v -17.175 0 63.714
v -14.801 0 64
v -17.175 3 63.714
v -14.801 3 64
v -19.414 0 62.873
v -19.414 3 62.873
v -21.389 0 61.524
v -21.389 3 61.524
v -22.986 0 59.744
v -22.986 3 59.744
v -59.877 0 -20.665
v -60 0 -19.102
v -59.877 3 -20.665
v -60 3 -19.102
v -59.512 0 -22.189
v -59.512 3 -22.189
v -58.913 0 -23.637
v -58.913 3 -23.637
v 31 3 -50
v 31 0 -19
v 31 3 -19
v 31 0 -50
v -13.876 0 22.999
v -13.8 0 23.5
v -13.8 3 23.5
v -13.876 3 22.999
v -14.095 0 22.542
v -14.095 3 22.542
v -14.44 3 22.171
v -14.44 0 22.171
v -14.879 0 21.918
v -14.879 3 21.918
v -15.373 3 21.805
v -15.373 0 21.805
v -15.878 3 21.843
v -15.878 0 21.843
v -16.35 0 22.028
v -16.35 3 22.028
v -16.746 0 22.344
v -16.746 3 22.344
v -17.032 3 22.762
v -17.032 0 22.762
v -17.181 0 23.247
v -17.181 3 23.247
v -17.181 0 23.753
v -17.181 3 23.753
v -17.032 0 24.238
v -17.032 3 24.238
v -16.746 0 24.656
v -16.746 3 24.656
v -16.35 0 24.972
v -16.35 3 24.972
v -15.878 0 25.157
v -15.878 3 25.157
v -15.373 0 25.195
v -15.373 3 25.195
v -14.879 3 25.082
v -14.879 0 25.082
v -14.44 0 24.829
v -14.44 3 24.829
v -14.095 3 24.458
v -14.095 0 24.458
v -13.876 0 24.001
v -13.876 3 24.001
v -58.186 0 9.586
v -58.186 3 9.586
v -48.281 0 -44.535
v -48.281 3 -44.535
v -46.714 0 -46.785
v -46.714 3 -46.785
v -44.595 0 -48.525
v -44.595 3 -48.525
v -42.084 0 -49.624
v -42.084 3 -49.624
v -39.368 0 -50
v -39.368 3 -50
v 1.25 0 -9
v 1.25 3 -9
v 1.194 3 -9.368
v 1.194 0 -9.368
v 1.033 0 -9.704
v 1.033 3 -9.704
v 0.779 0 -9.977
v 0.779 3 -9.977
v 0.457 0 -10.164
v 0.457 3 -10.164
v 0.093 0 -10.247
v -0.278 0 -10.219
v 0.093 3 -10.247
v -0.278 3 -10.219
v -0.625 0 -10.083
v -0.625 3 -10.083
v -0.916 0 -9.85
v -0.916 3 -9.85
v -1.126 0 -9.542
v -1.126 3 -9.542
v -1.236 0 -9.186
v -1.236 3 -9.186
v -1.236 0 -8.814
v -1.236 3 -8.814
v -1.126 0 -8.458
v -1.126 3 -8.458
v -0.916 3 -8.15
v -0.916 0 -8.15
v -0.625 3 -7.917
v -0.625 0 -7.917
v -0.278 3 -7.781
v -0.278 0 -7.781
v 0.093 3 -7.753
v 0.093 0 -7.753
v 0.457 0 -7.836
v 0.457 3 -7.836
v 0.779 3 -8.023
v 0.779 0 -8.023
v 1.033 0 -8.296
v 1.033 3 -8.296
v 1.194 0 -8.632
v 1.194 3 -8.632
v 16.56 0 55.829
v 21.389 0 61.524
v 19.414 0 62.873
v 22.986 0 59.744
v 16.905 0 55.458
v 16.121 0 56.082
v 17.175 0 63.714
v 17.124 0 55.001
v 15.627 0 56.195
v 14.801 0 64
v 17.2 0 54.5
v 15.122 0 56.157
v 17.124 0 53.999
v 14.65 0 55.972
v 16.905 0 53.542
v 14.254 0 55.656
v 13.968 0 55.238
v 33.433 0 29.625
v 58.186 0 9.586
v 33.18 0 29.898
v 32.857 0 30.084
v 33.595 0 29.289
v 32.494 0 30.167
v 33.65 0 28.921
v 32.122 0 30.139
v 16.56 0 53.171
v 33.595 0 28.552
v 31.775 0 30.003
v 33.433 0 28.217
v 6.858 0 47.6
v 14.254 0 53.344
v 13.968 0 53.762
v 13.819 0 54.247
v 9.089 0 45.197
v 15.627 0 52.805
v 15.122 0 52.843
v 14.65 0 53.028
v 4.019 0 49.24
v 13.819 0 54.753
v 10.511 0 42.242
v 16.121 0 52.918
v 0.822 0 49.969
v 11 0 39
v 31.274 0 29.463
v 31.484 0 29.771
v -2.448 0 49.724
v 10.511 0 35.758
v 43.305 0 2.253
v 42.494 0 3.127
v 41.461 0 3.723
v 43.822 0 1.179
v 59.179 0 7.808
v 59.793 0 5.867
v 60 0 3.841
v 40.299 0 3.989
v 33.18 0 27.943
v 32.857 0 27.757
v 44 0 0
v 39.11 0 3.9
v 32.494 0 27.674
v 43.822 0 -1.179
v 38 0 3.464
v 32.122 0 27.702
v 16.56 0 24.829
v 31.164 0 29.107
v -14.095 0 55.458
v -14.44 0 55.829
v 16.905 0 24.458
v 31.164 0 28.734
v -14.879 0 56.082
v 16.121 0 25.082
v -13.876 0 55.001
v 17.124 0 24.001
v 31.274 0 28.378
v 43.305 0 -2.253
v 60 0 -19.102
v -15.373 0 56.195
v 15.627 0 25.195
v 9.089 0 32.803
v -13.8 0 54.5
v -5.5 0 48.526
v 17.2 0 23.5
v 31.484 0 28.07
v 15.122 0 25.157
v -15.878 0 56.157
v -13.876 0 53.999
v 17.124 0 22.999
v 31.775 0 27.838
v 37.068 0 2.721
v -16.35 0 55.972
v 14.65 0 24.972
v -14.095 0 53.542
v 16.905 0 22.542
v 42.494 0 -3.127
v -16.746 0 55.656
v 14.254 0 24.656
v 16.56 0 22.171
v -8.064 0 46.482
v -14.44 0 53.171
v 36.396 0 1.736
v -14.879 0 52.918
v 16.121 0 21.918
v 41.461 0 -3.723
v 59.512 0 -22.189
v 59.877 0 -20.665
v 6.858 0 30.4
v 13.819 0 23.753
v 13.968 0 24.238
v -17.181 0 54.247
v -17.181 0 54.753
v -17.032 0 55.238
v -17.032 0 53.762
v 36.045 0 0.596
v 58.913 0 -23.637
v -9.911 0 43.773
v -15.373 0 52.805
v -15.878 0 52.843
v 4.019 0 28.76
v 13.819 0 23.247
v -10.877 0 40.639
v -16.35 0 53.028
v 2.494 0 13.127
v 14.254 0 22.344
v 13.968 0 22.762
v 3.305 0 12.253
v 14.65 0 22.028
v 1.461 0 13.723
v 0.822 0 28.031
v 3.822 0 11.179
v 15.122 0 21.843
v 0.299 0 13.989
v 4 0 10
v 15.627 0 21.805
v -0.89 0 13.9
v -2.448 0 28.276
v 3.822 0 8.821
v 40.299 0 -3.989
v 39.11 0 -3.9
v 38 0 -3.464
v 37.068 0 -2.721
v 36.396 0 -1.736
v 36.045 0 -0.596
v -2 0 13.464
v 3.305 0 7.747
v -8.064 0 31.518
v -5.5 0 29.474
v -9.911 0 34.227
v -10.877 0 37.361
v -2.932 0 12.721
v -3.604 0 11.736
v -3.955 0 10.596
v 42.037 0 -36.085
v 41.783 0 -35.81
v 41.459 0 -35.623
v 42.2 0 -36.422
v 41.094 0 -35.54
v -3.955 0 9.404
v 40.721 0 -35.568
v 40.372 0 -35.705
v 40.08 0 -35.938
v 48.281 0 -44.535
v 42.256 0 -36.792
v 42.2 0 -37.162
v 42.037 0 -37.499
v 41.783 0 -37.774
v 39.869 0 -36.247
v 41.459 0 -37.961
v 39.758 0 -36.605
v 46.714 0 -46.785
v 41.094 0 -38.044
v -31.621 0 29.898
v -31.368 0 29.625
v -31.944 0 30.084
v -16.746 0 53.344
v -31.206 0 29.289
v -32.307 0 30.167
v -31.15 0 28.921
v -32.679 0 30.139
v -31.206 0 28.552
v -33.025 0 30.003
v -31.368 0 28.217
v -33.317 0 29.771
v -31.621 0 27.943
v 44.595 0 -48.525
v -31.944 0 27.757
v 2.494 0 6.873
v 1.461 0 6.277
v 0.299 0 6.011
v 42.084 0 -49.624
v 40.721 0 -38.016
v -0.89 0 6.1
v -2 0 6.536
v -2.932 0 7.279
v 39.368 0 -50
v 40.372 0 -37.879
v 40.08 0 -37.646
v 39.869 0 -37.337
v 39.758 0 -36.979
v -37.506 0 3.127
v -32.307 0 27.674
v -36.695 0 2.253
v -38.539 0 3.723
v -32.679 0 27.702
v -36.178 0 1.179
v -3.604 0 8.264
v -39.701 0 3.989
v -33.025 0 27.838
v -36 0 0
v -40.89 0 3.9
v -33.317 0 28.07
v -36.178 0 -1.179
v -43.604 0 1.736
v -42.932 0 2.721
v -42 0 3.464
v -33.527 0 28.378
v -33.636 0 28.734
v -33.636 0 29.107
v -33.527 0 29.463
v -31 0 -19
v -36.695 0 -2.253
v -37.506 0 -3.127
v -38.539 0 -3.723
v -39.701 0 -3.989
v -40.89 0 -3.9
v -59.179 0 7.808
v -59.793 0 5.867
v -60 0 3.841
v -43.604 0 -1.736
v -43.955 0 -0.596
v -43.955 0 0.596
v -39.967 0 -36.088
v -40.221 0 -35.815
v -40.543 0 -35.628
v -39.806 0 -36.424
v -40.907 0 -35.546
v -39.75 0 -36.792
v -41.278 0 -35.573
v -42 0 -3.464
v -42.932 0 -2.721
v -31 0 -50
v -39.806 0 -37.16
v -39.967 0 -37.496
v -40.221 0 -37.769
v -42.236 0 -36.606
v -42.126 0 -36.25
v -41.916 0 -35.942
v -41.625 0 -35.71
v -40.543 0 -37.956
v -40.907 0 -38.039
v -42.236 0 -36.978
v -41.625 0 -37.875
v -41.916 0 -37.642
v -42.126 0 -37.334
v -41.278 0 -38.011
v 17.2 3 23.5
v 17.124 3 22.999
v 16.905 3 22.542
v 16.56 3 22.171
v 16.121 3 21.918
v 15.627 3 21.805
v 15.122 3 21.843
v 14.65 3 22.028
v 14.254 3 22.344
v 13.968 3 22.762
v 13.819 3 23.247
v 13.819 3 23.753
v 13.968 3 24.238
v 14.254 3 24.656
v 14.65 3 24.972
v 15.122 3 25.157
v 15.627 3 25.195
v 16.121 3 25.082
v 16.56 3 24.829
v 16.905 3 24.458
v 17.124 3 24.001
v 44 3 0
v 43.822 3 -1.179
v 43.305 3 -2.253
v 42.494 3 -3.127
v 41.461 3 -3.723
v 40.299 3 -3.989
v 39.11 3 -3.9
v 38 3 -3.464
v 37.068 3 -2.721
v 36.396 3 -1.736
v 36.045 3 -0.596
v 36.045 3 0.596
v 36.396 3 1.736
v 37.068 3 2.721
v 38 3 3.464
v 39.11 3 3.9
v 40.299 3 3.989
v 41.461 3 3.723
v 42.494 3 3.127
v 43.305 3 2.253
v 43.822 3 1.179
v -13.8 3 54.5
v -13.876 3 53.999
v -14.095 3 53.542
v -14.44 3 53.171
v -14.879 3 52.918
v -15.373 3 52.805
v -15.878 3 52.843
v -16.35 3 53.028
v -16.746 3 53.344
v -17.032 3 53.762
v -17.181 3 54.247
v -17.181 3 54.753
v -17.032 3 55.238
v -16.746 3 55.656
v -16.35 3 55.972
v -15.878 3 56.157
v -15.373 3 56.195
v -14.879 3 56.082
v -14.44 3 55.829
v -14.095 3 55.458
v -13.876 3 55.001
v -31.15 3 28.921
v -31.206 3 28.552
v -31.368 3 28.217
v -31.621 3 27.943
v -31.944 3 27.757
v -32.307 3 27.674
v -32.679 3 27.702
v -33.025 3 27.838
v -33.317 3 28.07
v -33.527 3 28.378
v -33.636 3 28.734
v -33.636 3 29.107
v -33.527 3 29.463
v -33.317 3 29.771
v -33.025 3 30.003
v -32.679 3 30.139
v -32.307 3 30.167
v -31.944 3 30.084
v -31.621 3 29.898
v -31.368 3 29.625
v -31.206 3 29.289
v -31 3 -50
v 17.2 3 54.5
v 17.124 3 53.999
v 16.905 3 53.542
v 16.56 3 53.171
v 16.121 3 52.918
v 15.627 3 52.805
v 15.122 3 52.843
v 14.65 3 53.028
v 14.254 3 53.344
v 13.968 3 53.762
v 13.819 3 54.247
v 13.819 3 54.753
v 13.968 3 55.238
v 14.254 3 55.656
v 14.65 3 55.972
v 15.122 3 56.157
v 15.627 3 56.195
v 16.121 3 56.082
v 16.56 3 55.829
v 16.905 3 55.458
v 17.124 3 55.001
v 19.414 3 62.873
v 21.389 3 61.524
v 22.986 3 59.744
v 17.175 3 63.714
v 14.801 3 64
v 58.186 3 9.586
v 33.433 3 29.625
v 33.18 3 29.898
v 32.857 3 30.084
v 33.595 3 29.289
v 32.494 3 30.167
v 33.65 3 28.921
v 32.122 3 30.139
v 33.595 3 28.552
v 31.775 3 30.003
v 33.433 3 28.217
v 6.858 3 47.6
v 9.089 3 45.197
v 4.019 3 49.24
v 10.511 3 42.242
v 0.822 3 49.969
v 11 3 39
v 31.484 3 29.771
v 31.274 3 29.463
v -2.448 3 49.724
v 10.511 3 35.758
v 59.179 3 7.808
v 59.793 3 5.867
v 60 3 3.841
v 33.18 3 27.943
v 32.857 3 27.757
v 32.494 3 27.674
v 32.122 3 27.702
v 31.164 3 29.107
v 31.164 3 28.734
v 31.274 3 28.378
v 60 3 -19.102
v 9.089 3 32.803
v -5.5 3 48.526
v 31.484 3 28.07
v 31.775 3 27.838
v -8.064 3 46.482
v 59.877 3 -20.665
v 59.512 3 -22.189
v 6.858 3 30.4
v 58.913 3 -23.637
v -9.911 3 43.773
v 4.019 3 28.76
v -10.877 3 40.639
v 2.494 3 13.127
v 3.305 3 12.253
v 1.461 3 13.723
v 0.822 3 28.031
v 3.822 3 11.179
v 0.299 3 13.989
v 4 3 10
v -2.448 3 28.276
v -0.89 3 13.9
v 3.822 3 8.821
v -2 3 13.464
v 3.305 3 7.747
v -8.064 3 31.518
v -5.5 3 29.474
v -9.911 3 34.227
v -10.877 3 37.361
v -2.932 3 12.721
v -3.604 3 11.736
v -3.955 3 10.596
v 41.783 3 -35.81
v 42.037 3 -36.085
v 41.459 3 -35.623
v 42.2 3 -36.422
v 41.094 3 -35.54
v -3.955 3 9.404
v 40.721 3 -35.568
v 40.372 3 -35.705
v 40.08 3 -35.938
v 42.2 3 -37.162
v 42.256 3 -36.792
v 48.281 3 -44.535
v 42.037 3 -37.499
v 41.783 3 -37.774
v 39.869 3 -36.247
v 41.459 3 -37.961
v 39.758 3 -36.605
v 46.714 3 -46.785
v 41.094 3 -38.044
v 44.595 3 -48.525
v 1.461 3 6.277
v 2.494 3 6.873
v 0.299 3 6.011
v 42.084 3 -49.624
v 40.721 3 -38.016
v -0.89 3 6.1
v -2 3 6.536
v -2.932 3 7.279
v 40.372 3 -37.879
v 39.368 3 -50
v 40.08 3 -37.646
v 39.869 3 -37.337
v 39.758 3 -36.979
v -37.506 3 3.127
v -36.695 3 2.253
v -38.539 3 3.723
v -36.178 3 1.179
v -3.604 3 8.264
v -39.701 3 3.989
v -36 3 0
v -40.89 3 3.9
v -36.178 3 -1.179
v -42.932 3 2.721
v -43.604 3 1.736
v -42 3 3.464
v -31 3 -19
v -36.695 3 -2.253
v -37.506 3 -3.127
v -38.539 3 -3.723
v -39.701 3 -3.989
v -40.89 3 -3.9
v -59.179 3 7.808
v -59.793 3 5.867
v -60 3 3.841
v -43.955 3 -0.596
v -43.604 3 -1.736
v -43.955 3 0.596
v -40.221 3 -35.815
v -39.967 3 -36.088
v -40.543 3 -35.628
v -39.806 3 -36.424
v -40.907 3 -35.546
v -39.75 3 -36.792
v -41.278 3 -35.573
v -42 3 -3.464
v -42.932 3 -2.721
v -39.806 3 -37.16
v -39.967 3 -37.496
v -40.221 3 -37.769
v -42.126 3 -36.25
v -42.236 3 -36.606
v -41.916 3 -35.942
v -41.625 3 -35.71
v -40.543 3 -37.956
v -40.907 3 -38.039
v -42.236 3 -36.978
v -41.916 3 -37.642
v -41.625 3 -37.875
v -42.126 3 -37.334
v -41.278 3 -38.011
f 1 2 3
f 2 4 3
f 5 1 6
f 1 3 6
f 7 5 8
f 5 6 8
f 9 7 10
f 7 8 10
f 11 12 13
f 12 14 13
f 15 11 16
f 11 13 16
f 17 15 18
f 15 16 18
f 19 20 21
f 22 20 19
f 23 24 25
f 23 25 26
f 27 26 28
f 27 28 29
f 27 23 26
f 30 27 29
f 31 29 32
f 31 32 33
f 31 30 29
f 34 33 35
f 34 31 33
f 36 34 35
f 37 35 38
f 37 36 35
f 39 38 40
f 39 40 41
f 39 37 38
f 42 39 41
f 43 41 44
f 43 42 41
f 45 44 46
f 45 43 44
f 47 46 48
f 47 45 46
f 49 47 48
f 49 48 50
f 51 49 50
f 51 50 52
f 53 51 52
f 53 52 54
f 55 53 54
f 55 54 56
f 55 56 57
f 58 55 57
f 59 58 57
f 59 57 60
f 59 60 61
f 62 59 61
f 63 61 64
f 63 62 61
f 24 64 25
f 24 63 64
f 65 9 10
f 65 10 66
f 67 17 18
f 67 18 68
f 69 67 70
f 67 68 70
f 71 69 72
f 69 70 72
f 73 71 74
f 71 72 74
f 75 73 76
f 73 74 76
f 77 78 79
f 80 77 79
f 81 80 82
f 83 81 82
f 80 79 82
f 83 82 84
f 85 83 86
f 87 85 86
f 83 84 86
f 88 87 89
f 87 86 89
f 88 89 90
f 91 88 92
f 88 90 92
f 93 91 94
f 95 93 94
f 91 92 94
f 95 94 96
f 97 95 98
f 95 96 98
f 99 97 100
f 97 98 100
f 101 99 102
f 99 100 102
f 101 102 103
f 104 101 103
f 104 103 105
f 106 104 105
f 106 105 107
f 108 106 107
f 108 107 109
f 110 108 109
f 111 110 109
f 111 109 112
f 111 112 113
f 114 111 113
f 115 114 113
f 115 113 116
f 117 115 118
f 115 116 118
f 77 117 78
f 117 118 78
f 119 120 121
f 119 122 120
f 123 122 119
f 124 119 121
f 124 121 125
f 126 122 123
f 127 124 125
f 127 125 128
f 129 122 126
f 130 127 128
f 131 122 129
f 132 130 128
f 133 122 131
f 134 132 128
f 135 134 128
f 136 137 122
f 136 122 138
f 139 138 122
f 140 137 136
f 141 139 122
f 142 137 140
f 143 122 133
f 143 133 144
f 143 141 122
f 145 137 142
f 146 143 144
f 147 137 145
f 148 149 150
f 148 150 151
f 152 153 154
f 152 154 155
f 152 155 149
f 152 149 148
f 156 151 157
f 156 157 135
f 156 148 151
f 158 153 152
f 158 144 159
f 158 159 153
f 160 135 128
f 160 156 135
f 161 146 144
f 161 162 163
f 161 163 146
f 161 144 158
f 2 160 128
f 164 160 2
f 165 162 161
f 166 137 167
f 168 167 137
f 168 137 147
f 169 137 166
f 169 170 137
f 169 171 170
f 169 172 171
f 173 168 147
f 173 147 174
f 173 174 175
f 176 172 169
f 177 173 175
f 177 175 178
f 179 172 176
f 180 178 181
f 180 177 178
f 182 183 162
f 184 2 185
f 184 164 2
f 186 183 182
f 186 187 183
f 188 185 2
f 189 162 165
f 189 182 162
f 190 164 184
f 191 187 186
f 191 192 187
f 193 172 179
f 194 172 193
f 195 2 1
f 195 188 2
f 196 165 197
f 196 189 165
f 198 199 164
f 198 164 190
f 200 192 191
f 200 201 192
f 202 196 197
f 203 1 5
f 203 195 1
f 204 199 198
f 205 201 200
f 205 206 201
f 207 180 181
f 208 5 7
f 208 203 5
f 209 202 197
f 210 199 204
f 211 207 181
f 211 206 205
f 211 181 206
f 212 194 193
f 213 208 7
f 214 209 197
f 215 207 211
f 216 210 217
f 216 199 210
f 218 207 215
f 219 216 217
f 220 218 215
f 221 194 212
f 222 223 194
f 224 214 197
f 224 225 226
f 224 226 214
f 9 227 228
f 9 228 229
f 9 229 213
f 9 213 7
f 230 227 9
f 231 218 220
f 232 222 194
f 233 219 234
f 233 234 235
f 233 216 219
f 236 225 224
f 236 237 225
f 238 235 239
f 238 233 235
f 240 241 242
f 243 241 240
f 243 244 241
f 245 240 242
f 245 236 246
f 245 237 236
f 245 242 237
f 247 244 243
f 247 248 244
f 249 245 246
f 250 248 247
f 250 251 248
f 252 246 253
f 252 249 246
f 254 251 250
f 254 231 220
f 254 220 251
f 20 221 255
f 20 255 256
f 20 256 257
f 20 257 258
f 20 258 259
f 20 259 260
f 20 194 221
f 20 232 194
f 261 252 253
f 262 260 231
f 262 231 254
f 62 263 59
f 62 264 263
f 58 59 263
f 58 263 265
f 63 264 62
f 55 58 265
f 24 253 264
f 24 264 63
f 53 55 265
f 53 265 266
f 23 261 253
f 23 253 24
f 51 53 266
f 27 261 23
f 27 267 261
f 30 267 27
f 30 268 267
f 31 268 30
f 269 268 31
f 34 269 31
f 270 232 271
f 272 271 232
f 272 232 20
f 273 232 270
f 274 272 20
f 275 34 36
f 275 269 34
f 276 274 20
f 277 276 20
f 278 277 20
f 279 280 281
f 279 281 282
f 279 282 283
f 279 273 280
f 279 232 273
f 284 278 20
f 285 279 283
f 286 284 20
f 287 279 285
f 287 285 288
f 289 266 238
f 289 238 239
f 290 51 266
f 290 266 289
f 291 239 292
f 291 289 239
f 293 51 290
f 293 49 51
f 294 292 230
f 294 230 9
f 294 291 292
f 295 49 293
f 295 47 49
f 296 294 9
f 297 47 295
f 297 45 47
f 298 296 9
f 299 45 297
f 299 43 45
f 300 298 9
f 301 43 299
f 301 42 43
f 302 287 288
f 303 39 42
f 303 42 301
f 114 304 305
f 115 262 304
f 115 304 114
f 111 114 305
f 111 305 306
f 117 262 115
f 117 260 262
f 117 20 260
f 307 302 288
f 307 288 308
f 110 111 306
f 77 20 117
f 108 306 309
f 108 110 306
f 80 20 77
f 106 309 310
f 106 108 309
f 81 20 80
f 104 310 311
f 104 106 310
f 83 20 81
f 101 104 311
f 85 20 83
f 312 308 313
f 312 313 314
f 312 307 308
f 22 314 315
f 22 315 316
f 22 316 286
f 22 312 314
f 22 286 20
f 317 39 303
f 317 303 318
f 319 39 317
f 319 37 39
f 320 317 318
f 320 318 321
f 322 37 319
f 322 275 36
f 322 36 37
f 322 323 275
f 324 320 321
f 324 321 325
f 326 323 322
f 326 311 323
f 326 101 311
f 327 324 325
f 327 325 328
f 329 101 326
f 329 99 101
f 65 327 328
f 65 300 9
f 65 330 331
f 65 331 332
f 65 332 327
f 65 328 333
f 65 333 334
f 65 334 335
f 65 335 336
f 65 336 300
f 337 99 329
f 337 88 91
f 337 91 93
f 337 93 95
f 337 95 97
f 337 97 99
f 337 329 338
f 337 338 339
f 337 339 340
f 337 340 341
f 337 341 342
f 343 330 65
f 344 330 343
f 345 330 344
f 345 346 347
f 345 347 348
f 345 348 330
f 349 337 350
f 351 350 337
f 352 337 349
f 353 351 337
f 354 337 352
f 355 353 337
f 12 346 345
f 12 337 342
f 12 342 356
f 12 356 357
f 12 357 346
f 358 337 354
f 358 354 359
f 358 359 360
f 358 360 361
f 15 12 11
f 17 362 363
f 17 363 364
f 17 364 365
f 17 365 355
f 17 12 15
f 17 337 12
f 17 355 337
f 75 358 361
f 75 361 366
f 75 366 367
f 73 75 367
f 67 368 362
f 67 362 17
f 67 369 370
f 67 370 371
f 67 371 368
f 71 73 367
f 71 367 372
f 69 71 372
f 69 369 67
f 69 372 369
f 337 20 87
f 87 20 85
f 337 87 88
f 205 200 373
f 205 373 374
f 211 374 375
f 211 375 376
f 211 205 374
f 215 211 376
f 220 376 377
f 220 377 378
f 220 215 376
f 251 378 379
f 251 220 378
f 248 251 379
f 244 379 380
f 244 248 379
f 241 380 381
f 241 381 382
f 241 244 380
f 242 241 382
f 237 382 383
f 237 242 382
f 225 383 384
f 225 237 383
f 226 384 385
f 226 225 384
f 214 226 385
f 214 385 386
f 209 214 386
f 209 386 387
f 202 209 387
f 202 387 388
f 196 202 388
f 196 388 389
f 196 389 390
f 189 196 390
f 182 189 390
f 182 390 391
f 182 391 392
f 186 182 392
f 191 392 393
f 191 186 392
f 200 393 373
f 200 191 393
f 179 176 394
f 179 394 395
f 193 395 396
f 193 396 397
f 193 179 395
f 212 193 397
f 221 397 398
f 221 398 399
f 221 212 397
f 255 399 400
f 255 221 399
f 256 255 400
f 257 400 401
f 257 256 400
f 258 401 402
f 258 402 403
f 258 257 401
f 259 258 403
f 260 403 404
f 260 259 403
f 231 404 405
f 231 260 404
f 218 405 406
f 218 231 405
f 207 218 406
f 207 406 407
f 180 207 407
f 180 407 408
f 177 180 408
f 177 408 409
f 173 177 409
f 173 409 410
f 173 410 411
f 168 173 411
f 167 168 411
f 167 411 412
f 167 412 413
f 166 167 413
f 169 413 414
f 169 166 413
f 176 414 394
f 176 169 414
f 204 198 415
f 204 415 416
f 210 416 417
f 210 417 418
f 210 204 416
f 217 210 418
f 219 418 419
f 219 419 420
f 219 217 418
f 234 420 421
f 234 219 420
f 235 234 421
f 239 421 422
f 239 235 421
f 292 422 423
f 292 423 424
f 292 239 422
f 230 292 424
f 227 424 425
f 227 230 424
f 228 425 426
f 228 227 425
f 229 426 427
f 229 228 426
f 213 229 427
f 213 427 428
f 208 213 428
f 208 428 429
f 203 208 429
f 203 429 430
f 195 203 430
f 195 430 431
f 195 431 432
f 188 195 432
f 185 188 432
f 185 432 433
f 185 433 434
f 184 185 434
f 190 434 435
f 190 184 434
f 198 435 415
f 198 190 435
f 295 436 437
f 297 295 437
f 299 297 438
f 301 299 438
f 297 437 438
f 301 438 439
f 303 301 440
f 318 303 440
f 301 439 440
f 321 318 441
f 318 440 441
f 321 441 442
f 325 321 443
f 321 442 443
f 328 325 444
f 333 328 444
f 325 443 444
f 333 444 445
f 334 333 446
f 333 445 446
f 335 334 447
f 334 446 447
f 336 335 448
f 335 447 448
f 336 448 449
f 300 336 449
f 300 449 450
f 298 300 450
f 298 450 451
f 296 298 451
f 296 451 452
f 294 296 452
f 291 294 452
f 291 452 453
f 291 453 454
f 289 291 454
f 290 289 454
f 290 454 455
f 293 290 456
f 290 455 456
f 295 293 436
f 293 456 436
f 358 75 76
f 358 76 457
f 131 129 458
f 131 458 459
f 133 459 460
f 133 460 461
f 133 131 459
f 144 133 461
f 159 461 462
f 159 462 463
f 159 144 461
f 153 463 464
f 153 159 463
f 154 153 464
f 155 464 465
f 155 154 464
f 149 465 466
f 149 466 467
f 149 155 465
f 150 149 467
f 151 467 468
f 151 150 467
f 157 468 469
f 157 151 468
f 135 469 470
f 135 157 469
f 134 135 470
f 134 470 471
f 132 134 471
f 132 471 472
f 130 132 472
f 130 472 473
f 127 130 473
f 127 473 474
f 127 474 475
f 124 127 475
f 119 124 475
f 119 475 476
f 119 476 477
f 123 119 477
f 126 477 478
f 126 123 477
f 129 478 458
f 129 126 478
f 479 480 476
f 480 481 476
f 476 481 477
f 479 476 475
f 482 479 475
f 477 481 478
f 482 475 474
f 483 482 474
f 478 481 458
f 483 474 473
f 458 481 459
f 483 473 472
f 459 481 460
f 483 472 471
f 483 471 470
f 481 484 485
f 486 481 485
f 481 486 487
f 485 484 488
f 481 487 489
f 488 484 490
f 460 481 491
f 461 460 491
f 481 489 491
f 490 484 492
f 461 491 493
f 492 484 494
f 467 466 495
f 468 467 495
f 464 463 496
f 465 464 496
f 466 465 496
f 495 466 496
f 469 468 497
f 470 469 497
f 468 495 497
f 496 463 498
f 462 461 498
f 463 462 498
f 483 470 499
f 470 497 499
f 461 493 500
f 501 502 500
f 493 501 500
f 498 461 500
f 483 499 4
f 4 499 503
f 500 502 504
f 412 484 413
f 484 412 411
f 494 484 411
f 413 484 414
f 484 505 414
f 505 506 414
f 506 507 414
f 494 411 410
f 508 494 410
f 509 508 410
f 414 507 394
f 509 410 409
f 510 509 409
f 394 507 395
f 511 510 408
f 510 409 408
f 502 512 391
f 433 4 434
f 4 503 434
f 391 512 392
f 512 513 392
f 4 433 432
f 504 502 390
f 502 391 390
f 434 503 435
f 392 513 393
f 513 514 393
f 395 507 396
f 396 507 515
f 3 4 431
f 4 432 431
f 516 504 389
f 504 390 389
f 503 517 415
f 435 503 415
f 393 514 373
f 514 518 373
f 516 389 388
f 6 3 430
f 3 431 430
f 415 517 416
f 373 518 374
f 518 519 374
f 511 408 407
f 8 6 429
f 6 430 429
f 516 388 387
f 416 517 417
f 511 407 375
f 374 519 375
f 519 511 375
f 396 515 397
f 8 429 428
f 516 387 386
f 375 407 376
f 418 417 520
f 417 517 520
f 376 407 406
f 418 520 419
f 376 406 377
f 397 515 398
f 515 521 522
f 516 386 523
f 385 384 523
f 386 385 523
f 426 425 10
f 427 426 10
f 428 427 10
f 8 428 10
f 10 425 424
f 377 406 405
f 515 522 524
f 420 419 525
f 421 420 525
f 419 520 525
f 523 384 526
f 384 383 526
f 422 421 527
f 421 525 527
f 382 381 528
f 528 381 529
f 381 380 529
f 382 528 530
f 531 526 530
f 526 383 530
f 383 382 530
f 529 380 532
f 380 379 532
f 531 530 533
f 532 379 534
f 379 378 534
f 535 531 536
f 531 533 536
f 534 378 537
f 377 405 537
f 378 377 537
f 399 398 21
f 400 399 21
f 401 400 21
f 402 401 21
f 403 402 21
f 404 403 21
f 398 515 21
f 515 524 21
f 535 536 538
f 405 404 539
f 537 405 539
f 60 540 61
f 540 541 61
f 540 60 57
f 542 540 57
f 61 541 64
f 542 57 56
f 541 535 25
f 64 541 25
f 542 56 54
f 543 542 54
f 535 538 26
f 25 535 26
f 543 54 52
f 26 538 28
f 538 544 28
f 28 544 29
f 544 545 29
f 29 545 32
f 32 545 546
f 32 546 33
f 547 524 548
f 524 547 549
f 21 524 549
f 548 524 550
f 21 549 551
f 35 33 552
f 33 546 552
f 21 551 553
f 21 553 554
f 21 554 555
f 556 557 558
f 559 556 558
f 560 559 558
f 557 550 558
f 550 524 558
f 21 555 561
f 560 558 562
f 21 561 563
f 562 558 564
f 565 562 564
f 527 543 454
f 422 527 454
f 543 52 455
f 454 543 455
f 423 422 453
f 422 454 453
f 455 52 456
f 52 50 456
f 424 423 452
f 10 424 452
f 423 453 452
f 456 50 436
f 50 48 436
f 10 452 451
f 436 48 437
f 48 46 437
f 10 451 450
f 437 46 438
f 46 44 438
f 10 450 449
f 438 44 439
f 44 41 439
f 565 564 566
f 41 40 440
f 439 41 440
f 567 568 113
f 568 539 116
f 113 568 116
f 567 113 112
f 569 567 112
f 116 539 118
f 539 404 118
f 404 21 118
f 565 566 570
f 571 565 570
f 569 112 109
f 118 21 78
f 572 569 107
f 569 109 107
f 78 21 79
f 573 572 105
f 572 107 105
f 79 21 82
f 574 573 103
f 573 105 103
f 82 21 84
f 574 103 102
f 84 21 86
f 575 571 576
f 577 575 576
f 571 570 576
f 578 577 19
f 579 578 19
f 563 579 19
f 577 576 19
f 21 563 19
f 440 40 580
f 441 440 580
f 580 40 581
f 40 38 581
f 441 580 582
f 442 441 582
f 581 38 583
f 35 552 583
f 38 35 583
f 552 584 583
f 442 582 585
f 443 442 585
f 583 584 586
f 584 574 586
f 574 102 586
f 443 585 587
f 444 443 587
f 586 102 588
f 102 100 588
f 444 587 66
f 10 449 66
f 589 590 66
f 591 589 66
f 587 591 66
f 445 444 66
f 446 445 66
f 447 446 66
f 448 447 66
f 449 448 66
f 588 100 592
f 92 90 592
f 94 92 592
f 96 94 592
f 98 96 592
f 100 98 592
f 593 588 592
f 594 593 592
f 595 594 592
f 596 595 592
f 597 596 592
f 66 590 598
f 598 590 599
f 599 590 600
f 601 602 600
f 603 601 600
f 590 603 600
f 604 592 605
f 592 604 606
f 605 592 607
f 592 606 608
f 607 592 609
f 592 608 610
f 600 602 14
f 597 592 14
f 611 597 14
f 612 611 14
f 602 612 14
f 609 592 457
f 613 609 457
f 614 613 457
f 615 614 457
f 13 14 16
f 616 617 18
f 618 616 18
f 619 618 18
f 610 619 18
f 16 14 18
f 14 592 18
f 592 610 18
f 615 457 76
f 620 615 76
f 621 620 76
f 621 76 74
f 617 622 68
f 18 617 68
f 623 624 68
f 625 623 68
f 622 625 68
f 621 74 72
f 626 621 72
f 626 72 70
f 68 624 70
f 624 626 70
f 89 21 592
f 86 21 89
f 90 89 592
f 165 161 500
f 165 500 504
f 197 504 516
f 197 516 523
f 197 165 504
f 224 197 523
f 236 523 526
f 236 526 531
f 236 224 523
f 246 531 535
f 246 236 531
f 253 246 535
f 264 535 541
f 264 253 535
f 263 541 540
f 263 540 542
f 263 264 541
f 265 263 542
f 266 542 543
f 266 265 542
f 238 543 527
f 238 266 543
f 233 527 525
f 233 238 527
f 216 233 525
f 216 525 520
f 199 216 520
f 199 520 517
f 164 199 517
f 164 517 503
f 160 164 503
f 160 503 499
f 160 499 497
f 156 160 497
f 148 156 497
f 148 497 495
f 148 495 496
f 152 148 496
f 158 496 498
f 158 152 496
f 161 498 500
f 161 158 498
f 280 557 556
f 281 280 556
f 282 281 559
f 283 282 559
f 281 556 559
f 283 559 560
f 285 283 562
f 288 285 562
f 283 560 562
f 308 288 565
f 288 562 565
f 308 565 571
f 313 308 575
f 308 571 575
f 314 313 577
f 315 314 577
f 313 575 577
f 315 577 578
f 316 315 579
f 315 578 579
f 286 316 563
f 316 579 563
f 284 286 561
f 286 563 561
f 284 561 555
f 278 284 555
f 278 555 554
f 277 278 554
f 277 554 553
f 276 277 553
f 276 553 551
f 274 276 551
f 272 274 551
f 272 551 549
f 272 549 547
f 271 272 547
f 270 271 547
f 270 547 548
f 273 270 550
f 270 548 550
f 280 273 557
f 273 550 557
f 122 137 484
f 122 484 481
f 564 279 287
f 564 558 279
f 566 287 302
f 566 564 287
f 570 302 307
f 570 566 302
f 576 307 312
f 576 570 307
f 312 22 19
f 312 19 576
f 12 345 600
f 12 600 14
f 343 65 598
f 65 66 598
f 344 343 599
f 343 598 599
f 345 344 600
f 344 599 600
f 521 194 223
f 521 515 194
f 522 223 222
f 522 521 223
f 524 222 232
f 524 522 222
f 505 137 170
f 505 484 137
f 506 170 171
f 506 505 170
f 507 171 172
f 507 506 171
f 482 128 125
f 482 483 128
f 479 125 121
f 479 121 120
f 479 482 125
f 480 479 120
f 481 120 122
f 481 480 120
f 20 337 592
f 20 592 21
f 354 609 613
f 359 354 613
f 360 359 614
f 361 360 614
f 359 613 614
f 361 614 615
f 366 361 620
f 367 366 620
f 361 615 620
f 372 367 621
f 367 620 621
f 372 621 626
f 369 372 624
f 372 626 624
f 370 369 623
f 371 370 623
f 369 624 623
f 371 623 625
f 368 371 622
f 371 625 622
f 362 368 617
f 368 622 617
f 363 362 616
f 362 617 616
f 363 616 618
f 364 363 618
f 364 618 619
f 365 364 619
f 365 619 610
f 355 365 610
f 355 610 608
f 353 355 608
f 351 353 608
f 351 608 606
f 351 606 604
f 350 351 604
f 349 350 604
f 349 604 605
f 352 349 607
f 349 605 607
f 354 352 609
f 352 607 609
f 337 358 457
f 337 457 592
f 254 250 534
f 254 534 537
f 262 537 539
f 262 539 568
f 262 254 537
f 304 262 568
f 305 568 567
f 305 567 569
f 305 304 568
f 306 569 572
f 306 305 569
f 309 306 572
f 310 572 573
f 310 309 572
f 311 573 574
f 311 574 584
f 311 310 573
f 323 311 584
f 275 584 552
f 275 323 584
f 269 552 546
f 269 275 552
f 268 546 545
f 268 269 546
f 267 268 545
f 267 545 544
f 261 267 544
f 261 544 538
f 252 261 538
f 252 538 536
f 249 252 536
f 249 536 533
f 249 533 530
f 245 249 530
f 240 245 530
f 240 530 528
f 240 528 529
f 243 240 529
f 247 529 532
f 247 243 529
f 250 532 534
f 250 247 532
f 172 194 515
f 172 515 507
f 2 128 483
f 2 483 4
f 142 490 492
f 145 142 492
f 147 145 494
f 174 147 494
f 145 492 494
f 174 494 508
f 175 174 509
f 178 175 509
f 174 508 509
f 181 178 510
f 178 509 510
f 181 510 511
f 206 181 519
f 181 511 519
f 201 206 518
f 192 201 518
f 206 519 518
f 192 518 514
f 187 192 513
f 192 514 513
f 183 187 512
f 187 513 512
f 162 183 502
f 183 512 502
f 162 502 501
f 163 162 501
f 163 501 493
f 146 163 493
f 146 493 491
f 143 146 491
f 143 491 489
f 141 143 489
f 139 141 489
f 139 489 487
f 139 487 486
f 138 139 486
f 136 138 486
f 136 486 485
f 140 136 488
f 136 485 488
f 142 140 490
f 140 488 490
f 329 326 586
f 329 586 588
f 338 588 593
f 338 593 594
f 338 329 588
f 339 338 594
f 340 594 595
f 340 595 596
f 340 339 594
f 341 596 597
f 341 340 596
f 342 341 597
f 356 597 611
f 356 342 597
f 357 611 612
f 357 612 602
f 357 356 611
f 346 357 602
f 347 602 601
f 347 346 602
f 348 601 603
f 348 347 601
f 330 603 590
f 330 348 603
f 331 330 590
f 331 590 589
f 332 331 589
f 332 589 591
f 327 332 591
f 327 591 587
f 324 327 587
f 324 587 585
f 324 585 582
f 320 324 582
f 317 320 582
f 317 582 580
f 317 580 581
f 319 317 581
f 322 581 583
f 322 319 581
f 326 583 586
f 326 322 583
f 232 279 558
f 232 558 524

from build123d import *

# Parameters (mm, degrees)
SKETCH1_R           = 4
SKETCH1_R_2         = 1.7
SKETCH1_R_3         = 11
BOSS_EXTRUDE1_DEPTH = 3
FILLET1_R           = 10
SKETCH2_R           = 1.25
SKETCH2_R_2         = 1.255555556
CUT_EXTRUDE1_DEPTH  = 3


with BuildPart() as part:
    # Sketch1 → Boss-Extrude1 (new body)
    with BuildSketch(Plane(origin=(0, 0, 0), x_dir=(1, 0, 0), z_dir=(0, 1, 0))):
        Polygon((20, -64), (-20, -64), (-60, -7), (-60, 21.5), (-45.5, 50), (-31, 50), (-31, 19), (31, 19), (31, 50), (45.5, 50), (60, 21.5), (60, -7), align=None)
        with Locations((0, -10)):
            Circle(SKETCH1_R, mode=Mode.SUBTRACT)
        with Locations((-40, 0)):
            Circle(SKETCH1_R, mode=Mode.SUBTRACT)
        with Locations((40, 0)):
            Circle(SKETCH1_R, mode=Mode.SUBTRACT)
        with Locations((-15.5, -23.5)):
            Circle(SKETCH1_R_2, mode=Mode.SUBTRACT)
        with Locations((15.5, -23.5)):
            Circle(SKETCH1_R_2, mode=Mode.SUBTRACT)
        with Locations((15.5, -54.5)):
            Circle(SKETCH1_R_2, mode=Mode.SUBTRACT)
        with Locations((-15.5, -54.5)):
            Circle(SKETCH1_R_2, mode=Mode.SUBTRACT)
        with Locations((0, -39)):
            Circle(SKETCH1_R_3, mode=Mode.SUBTRACT)
    extrude(amount=BOSS_EXTRUDE1_DEPTH)

    # Fillet1
    fillet1_edges = [part.edges().sort_by_distance(p)[0] for p in [
        (45.5, 1.5, -50),
        (60, 1.5, -21.5),
        (60, 1.5, 7),
        (20, 1.5, 64),
        (-20, 1.5, 64),
        (-60, 1.5, 7),
        (-60, 1.5, -21.5),
        (-45.5, 1.5, -50),
    ]]
    fillet(fillet1_edges, radius=FILLET1_R)

    # Sketch2 → Cut-Extrude1 (cut)
    with BuildSketch(Plane(origin=(0, 3, 0), x_dir=(1, 0, 0), z_dir=(0, 1, 0))):
        with Locations((-32.400459523, -28.920654821)):
            Circle(SKETCH2_R)
        with Locations((32.400459523, -28.920654821)):
            Circle(SKETCH2_R)
        with Locations((0, 9)):
            Circle(SKETCH2_R)
        with Locations((-41, 36.792031786)):
            Circle(SKETCH2_R)
        with Locations((41, 36.792031786)):
            Circle(SKETCH2_R_2)
    extrude(amount=-CUT_EXTRUDE1_DEPTH, mode=Mode.SUBTRACT)


solid = part.part
